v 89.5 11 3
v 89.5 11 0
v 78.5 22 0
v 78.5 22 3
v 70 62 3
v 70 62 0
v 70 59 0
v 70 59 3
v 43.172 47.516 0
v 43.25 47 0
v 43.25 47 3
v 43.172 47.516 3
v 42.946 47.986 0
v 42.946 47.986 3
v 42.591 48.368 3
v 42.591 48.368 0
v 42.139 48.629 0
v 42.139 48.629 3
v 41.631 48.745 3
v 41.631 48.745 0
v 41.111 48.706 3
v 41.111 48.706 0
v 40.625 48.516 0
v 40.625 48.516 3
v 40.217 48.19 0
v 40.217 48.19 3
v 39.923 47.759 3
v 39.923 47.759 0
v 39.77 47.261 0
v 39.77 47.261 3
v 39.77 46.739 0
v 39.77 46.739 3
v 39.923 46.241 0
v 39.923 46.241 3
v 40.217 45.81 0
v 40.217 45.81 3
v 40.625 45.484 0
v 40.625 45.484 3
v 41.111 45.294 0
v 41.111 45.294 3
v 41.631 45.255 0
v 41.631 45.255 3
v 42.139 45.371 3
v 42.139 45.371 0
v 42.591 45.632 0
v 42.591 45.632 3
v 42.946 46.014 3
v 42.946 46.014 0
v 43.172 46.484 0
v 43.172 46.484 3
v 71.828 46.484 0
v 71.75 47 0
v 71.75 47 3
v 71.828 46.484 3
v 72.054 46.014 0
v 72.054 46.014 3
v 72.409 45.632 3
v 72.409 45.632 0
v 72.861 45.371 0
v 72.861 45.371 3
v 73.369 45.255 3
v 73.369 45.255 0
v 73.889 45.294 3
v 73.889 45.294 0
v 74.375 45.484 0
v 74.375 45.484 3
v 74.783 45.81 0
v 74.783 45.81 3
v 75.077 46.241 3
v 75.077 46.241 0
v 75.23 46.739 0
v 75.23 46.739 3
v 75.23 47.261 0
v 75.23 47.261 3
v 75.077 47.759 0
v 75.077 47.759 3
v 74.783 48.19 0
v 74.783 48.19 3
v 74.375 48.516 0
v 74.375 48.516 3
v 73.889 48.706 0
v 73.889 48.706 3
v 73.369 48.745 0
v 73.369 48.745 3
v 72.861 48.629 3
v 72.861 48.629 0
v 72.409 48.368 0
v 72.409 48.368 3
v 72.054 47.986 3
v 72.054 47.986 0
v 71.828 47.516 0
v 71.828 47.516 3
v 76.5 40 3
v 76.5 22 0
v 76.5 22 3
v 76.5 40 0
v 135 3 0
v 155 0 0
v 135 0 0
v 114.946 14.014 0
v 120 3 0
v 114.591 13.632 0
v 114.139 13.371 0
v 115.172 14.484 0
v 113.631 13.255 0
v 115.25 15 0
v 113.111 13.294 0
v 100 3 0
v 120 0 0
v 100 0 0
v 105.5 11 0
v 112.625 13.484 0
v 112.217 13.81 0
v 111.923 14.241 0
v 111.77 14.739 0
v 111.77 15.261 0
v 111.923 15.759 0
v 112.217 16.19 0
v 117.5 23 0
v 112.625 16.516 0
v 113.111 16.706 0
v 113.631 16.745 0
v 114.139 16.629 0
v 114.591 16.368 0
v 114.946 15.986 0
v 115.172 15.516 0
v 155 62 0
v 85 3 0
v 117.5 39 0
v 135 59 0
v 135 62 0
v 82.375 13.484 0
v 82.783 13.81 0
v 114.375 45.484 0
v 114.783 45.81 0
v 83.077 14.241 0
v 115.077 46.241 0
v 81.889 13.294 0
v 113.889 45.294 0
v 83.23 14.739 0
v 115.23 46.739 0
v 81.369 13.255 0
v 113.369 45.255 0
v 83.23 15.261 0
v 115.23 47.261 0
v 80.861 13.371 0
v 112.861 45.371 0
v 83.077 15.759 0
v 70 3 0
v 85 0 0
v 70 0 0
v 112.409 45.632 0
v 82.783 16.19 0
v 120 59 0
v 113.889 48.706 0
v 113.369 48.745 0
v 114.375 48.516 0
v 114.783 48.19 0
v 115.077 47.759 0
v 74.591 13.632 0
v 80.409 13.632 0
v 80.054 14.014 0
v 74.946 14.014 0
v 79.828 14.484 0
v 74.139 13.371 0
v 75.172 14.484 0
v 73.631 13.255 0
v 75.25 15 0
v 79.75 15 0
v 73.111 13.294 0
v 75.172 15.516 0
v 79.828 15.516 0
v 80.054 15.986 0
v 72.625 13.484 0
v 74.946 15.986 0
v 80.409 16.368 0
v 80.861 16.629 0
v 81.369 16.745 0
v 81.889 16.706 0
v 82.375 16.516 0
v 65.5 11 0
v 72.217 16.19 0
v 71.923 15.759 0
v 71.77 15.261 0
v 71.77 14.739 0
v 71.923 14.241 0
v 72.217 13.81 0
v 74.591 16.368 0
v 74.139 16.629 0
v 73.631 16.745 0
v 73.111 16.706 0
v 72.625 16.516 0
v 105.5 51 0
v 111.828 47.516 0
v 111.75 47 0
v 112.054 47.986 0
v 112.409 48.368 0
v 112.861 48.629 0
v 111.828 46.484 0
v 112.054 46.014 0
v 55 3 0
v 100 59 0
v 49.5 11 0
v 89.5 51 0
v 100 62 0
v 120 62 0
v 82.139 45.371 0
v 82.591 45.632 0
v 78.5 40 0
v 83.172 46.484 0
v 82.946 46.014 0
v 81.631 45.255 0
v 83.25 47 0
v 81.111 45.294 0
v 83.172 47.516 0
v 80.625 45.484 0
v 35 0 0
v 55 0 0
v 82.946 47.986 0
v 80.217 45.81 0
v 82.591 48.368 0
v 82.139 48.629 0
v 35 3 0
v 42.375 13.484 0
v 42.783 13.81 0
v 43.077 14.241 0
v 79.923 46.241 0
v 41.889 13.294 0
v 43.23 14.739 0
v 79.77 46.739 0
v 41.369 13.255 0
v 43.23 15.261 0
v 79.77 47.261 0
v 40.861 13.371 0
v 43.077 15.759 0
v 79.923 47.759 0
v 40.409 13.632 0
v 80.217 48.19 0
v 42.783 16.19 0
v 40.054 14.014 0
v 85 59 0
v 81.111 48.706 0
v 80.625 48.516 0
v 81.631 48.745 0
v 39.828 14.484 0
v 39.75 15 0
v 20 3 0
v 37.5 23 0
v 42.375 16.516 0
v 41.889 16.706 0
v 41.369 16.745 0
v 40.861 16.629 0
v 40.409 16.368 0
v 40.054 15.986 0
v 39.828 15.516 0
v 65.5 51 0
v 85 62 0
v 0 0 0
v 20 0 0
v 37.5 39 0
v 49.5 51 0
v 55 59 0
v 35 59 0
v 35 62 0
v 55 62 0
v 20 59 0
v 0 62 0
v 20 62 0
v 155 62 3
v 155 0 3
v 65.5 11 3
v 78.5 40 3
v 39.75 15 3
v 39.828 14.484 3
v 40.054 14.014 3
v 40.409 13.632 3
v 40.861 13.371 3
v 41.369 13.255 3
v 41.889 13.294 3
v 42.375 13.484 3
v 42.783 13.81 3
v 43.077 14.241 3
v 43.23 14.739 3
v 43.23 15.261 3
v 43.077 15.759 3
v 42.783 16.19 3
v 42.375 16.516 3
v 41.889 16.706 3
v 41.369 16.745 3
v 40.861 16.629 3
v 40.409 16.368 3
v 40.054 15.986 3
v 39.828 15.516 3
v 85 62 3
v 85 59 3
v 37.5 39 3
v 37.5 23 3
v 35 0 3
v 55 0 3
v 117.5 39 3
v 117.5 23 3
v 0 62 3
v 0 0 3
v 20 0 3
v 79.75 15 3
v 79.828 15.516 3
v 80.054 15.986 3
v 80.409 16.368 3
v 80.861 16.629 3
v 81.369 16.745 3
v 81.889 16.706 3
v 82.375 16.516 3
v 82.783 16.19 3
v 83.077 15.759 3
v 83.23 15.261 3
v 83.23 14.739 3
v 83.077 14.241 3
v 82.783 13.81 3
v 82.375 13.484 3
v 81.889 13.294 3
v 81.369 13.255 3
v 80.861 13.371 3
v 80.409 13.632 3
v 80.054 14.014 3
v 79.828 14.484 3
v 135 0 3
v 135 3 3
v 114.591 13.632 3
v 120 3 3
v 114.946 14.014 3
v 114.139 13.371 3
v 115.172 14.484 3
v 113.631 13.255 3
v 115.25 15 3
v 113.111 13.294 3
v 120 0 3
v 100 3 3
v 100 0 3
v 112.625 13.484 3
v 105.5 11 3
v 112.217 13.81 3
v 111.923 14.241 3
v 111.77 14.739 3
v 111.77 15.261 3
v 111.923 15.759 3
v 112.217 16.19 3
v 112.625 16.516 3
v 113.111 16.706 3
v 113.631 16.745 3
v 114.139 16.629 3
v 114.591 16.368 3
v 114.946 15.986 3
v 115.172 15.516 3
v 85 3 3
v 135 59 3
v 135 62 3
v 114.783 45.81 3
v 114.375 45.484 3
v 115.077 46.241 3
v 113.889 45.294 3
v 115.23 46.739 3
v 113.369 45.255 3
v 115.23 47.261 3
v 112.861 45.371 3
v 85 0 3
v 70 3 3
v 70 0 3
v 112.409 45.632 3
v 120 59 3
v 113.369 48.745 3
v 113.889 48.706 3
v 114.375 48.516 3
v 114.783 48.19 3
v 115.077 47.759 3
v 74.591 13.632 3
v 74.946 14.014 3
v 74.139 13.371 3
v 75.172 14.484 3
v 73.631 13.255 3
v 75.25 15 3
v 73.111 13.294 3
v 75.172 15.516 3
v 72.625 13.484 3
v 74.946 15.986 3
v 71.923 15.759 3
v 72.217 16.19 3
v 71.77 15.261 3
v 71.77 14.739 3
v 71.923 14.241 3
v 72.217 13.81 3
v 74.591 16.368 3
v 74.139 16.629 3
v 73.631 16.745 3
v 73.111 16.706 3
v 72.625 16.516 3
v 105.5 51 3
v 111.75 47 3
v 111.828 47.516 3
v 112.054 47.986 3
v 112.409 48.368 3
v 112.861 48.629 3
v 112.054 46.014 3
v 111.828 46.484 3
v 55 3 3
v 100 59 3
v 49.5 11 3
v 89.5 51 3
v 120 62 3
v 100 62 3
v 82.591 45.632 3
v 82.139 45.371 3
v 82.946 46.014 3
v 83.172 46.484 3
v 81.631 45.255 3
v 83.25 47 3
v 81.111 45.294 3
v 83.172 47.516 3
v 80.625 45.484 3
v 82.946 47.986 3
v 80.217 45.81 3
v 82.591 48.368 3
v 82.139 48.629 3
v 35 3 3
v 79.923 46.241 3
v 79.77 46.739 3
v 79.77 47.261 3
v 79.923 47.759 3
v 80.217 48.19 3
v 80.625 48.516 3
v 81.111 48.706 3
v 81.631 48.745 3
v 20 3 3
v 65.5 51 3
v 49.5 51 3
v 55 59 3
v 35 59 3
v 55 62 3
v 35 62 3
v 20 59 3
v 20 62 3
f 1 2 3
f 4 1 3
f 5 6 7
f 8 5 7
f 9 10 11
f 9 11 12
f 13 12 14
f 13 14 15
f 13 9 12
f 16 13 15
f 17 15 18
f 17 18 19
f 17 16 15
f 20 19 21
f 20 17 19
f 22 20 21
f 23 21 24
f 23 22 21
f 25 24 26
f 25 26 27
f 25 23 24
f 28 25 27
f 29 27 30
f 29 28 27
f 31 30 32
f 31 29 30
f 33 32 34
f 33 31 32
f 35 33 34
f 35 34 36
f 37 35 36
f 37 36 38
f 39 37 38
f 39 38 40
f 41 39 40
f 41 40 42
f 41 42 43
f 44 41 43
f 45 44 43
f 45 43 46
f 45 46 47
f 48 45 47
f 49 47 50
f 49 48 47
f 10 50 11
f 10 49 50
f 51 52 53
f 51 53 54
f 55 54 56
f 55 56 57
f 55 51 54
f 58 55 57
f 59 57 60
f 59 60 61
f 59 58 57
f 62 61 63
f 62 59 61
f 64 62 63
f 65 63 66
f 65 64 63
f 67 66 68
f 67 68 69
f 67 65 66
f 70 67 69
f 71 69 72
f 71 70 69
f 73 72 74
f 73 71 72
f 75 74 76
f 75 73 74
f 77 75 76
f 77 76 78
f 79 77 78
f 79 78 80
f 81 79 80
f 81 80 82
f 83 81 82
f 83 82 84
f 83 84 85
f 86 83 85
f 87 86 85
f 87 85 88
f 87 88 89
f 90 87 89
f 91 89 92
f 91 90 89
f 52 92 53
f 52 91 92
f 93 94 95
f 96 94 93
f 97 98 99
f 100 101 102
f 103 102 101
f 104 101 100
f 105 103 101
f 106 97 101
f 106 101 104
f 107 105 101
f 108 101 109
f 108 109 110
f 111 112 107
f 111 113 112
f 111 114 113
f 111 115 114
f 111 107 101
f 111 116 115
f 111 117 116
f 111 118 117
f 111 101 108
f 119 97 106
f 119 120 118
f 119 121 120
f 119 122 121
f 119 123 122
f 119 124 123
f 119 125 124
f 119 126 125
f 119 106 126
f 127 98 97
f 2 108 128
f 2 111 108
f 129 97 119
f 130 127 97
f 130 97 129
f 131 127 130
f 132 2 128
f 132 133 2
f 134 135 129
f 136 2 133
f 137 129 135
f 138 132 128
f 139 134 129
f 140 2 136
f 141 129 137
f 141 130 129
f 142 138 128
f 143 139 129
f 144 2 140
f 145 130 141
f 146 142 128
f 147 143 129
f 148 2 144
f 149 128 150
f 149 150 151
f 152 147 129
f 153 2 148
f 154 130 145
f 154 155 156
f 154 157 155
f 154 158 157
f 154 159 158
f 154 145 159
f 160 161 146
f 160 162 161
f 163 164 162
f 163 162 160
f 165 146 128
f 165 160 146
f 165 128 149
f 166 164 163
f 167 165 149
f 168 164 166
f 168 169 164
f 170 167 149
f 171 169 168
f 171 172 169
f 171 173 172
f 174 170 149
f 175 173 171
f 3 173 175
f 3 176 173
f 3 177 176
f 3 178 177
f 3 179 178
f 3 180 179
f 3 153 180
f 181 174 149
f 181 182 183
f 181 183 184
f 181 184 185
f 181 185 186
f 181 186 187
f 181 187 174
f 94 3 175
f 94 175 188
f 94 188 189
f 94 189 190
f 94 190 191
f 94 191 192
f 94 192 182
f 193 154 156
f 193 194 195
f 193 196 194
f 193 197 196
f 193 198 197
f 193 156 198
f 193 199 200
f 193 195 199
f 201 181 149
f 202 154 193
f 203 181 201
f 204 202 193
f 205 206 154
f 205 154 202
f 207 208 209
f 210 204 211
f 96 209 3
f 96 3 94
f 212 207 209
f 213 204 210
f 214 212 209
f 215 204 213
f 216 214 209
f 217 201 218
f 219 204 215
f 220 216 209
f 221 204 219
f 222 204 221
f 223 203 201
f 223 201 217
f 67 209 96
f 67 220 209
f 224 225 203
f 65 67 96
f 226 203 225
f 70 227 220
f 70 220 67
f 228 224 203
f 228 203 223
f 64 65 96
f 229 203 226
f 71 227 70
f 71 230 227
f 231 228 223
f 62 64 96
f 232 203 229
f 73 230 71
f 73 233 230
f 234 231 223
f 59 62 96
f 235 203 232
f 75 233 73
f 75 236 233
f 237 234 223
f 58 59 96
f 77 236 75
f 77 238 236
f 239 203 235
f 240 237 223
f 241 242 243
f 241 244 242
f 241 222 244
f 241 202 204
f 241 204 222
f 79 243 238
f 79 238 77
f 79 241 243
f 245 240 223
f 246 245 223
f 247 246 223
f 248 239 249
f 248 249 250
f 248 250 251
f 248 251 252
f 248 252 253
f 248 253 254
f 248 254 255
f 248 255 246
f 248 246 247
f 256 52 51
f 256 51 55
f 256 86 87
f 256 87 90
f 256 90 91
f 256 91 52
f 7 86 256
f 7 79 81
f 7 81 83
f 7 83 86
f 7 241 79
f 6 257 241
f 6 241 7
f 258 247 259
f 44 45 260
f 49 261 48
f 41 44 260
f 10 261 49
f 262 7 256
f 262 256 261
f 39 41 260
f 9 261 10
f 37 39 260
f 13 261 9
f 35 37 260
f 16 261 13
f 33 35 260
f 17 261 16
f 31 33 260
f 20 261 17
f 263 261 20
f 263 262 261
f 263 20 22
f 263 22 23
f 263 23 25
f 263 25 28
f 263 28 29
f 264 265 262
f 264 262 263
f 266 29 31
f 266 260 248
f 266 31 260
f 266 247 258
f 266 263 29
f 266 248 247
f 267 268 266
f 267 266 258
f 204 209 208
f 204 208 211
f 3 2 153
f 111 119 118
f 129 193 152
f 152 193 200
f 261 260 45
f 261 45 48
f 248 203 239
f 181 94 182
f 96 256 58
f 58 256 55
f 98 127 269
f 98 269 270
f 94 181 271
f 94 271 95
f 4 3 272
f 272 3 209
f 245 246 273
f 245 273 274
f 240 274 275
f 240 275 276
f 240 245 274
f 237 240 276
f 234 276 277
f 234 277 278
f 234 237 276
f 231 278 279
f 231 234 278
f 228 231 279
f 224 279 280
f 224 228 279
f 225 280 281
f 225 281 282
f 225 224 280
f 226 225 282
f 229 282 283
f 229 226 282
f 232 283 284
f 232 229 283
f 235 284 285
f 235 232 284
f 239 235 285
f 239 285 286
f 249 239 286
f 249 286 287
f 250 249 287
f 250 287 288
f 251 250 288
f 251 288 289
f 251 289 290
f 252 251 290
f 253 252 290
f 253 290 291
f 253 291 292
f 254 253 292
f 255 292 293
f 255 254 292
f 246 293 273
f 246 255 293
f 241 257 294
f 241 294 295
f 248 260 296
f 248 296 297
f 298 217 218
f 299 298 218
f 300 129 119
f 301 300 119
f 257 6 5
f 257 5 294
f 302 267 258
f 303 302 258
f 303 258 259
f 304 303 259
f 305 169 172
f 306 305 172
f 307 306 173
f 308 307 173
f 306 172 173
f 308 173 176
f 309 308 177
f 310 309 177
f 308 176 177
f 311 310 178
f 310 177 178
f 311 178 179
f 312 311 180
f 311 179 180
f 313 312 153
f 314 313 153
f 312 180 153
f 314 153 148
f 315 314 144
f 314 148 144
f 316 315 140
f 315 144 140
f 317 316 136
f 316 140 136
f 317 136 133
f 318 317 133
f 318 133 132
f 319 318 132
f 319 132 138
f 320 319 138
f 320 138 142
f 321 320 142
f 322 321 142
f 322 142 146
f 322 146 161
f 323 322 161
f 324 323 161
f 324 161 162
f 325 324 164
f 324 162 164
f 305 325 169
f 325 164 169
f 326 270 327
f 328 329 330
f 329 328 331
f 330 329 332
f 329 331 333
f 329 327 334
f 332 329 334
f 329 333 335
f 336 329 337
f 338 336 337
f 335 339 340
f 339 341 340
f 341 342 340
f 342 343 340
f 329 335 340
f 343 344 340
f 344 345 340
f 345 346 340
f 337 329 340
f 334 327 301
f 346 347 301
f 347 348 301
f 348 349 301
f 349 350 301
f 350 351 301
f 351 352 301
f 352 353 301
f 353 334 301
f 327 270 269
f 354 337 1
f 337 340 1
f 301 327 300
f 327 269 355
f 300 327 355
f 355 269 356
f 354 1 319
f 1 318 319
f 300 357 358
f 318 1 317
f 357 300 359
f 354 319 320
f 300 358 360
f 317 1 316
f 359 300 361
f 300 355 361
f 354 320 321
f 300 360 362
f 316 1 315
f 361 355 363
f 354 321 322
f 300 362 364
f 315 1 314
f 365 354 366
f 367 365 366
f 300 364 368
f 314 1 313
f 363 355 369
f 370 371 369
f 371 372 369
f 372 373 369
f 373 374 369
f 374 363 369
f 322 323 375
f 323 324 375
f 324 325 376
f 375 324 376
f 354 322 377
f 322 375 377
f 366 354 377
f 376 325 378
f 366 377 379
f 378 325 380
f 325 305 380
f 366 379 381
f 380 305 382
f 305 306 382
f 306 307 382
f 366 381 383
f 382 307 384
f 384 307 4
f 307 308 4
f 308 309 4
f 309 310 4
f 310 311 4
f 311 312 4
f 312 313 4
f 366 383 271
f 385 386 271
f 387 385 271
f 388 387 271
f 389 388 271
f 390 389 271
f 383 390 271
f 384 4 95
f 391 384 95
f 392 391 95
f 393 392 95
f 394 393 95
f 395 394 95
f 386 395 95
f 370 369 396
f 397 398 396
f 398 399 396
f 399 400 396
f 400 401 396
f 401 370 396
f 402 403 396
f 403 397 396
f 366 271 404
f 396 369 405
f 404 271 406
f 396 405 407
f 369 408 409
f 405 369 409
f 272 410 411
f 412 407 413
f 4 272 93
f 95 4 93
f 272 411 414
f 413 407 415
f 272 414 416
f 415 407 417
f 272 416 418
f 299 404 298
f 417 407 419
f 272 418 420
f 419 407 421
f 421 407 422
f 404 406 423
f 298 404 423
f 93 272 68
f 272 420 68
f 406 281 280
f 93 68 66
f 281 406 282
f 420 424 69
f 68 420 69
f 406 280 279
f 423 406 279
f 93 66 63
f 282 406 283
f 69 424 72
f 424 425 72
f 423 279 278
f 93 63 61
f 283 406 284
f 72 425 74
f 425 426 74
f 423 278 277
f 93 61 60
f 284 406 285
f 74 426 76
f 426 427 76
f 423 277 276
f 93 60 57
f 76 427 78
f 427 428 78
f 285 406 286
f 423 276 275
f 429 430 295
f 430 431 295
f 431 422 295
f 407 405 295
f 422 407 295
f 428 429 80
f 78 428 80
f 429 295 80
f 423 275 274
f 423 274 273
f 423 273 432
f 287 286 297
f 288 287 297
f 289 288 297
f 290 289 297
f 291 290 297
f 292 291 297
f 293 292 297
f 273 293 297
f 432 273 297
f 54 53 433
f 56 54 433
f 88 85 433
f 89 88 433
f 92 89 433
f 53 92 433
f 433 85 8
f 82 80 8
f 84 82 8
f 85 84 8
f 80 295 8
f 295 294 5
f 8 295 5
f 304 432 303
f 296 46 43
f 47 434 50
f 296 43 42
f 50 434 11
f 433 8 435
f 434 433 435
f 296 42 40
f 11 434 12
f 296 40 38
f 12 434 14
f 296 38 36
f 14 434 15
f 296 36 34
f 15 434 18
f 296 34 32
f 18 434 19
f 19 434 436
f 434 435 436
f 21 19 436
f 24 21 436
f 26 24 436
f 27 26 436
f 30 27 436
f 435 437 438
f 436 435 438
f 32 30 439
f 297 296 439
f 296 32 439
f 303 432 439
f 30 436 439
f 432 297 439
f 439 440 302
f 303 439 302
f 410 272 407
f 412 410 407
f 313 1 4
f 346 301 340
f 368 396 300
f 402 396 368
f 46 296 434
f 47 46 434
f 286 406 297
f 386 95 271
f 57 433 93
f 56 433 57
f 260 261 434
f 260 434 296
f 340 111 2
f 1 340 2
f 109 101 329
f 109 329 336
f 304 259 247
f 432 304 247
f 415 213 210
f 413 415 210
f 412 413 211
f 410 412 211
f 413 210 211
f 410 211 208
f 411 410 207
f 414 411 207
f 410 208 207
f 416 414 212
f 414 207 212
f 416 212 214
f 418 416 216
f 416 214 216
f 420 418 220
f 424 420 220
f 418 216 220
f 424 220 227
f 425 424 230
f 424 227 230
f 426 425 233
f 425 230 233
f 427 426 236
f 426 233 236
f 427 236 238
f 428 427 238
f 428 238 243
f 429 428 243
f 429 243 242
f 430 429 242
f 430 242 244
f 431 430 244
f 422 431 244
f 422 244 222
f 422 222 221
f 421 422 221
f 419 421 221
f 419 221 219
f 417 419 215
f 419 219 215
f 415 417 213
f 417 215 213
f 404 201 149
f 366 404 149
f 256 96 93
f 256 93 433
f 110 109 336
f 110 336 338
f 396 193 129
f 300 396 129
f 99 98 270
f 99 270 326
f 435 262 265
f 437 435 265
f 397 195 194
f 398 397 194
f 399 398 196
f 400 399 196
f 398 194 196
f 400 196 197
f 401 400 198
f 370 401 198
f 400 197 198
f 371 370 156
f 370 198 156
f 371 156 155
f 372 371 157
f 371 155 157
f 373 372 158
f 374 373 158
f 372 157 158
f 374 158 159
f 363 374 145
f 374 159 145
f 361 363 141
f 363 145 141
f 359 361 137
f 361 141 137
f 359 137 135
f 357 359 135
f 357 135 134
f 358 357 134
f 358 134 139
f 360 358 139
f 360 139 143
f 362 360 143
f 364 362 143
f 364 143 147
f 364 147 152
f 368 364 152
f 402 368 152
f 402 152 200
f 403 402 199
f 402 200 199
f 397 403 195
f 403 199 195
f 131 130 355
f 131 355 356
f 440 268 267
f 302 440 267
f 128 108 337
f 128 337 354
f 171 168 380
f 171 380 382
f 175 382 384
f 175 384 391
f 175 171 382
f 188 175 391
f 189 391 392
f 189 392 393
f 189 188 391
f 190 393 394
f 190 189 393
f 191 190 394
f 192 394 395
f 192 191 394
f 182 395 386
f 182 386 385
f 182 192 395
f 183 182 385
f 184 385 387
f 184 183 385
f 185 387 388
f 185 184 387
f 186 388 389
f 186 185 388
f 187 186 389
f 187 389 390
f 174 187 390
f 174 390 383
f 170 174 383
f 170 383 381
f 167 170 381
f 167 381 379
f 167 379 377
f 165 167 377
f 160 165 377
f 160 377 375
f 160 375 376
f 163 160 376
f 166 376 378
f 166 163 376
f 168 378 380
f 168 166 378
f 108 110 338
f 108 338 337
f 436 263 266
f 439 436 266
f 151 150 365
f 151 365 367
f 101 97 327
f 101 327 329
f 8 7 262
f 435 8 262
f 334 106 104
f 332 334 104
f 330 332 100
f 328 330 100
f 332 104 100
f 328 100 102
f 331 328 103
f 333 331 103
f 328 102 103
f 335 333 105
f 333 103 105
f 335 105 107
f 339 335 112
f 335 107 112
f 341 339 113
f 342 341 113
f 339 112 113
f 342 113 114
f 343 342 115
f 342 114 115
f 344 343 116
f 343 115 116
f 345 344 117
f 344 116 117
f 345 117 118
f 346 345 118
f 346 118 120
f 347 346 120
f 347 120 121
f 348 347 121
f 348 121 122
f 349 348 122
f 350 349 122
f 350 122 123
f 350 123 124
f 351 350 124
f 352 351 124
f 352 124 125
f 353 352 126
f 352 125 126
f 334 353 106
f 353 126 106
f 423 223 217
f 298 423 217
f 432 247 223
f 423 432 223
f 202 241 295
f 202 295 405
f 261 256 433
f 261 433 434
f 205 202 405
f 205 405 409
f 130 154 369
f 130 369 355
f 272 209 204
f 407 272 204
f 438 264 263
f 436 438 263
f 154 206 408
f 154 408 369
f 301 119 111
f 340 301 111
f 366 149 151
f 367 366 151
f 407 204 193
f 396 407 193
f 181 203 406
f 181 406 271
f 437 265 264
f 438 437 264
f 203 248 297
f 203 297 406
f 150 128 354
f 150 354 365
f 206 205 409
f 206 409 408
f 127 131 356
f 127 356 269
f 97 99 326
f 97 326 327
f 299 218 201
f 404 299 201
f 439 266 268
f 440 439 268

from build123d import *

# Parameters (mm, degrees)
SKICA1_R                = 1.75
P_IDAT_VYSUNUT_M1_DEPTH = 3


with BuildPart() as part:
    # Skica1 → Přidat vysunutím1 (new body)
    with BuildSketch(Plane.XY):
        Polygon((20, 3), (35, 3), (35, 0), (55, 0), (55, 3), (70, 3), (70, 0), (77.5, 0), (77.5, 11), (77.5, 20.346281592), (77.5, 41.653718408), (77.5, 51), (77.5, 62), (70, 62), (70, 59), (55, 59), (55, 62), (35, 62), (35, 59), (20, 59), (20, 62), (0, 62), (0, 0), (20, 0), align=None)
        with Locations((41.5, 47)):
            Circle(SKICA1_R, mode=Mode.SUBTRACT)
        with Locations(Location((41.5, 15, 0), (0, 0, 180))):
            Circle(SKICA1_R, mode=Mode.SUBTRACT)
        with Locations((73.5, 15)):
            Circle(SKICA1_R, mode=Mode.SUBTRACT)
        with Locations(Location((73.5, 47, 0), (0, 0, 180))):
            Circle(SKICA1_R, mode=Mode.SUBTRACT)
        Polygon((65.5, 51), (49.5, 51), (37.5, 39), (37.5, 23), (49.5, 11), (65.5, 11), (76.500000683, 22.000000683), (76.500000683, 39.999999317), align=None, mode=Mode.SUBTRACT)
    p_idat_vysunut_m1 = extrude(amount=P_IDAT_VYSUNUT_M1_DEPTH)

    # Zrcadlit1: Přidat vysunutím1 across plane
    add(p_idat_vysunut_m1.mirror(Plane(origin=(77.5, 51, 3), x_dir=(0, 0, 1), z_dir=(-1, 0, 0))))


solid = part.part
